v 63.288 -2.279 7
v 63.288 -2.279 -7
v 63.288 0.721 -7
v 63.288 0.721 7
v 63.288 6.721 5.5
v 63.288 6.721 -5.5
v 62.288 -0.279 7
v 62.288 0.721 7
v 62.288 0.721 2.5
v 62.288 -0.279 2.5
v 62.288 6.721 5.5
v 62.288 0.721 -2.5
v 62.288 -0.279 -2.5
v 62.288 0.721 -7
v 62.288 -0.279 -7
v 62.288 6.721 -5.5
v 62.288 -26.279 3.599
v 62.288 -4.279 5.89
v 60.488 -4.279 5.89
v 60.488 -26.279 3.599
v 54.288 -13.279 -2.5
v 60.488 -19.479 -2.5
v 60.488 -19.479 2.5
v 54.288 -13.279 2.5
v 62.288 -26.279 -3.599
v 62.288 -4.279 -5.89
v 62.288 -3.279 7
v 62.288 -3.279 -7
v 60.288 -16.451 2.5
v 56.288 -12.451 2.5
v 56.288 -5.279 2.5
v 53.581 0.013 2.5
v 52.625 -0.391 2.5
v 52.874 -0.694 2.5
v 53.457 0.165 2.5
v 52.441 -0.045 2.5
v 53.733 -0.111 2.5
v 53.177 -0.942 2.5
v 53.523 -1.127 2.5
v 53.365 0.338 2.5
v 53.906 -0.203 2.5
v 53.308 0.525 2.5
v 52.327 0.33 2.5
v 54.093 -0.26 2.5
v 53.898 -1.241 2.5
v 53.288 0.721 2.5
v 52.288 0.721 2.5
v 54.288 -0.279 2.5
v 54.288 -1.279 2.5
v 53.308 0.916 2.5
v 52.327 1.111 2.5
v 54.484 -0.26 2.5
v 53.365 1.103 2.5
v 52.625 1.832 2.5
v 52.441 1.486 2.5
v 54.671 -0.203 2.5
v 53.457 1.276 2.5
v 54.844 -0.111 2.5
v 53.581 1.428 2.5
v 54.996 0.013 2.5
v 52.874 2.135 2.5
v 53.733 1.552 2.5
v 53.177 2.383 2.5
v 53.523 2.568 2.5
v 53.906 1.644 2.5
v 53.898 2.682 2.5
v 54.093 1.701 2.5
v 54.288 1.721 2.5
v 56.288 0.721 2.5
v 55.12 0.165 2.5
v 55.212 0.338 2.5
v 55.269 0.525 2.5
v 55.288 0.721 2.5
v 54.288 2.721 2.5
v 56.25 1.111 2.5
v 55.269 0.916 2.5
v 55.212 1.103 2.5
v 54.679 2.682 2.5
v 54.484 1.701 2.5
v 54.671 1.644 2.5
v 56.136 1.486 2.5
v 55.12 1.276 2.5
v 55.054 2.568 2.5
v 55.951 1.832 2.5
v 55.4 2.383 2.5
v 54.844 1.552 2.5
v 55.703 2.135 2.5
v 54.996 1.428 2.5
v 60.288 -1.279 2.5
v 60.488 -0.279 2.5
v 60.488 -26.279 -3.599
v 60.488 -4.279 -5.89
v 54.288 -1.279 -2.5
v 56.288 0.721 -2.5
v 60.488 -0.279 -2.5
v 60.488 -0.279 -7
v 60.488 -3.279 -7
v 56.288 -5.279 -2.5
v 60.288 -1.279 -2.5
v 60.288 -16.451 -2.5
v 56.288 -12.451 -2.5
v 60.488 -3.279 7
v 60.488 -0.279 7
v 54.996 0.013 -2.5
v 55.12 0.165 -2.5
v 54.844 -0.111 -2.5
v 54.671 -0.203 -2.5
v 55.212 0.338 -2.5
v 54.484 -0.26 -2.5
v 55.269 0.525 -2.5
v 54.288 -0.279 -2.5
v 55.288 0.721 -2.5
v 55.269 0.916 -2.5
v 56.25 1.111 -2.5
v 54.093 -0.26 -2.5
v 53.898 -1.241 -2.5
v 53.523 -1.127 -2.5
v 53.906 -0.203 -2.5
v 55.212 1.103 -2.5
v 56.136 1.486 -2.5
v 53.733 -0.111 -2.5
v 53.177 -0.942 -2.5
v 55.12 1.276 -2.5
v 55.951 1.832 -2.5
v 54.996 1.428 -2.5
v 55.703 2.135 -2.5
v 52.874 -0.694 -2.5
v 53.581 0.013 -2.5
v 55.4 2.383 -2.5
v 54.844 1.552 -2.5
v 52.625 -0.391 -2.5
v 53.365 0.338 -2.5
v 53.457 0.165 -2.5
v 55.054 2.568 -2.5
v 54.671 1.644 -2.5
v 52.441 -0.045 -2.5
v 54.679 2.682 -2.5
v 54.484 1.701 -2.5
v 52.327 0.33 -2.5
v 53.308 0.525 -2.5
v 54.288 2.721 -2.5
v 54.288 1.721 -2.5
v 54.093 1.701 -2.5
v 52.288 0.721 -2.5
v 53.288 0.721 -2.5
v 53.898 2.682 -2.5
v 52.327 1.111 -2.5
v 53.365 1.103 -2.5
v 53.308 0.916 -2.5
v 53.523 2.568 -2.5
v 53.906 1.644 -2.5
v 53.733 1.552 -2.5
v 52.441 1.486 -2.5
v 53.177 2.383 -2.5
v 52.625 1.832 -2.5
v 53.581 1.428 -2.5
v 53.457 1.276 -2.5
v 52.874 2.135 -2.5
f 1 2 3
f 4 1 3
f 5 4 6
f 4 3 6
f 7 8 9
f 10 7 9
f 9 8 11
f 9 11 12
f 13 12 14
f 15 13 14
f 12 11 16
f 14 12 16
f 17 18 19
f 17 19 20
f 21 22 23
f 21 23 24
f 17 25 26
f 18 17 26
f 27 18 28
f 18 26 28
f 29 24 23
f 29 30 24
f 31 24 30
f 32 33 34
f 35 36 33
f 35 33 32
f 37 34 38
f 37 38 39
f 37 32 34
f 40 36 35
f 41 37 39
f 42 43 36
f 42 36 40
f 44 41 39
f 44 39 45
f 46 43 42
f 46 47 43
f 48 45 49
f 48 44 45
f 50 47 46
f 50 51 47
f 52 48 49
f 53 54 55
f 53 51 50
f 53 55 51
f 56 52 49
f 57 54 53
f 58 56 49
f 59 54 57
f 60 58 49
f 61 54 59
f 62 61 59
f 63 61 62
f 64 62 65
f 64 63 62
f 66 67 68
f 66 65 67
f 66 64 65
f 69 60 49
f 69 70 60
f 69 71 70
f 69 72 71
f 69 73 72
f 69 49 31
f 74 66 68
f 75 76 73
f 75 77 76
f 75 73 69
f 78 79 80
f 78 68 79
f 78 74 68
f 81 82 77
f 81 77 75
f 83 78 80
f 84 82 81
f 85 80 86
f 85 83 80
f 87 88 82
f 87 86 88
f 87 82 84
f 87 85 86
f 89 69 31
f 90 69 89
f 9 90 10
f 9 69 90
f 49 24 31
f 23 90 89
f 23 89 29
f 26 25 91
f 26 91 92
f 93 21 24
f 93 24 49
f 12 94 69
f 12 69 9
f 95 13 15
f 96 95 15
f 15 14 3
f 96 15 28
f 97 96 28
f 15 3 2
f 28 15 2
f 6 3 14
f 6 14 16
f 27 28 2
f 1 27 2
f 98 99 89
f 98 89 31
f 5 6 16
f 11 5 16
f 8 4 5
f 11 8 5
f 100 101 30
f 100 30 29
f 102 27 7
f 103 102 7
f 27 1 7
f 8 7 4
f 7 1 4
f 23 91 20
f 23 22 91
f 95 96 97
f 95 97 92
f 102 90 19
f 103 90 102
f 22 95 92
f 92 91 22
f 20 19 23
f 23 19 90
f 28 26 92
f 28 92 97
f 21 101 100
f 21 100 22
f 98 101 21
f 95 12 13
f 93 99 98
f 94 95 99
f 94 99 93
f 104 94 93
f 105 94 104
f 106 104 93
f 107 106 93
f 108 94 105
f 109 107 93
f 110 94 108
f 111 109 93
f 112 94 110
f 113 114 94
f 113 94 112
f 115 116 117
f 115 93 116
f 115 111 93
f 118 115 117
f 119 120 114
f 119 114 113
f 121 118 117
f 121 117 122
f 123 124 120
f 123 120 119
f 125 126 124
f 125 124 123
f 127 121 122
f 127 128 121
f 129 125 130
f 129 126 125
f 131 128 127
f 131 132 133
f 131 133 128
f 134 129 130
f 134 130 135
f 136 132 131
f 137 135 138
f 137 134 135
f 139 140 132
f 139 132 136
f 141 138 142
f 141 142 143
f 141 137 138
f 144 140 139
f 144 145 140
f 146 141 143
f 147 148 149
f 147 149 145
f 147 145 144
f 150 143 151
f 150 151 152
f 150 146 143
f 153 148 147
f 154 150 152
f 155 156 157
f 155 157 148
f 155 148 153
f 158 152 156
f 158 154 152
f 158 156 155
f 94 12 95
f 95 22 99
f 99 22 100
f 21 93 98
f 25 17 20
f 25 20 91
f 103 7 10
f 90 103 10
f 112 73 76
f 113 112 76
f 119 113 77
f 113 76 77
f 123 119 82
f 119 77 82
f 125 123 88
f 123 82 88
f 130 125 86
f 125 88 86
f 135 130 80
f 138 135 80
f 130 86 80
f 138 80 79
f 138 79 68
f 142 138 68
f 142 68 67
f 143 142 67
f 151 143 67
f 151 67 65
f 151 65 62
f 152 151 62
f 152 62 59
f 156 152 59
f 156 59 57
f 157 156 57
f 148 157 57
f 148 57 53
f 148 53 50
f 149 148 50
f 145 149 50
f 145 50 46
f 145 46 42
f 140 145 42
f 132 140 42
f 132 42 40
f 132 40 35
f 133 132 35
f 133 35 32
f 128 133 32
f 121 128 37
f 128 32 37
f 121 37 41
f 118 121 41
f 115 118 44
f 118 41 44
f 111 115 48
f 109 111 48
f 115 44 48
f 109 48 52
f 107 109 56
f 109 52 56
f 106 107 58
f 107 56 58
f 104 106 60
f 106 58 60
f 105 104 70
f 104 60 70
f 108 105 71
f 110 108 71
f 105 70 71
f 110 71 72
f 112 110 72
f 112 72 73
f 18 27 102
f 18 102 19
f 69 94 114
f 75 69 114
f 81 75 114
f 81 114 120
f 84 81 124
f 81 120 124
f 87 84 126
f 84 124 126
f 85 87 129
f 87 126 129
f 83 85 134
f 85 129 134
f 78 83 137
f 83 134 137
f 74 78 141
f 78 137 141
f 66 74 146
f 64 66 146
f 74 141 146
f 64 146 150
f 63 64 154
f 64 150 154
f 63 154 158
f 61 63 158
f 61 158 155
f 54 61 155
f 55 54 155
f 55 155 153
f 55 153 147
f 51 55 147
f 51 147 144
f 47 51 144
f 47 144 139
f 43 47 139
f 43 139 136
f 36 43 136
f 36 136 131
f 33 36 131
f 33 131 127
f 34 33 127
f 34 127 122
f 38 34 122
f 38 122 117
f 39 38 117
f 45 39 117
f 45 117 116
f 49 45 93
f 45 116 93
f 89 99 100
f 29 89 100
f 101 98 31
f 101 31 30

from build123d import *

# Parameters (mm, degrees)
EXTRUDE_1_DEPTH          = 2.5
EXTRUDE_1_DEPTH_BACK     = 2.5
EXTRUDE_2_DEPTH          = 3
EXTRUDE_3_DEPTH          = 1.8
CUT_EXTRUDE_1_DEPTH      = 72.103790411
CUT_EXTRUDE_1_DEPTH_BACK = 72.103790411
CUT_EXTRUDE_2_DEPTH      = 30.885943266
CUT_EXTRUDE_3_DEPTH      = 10
SKETCH_8_R               = 1
CUT_EXTRUDE_4_DEPTH      = 70.182991672


with BuildPart() as part:
    # 草图1 → 凸台-拉伸1 (new, two sides: drawn at the far end of the back side and taken through both)
    with BuildSketch(Plane.XY.offset(-EXTRUDE_1_DEPTH_BACK)):
        with BuildLine():
            ThreePointArc((56.288432405, 0.720527774), (52.874218842, 2.134741337), (54.288432405, -1.279472226))
            Line((54.288432405, -1.279472226), (54.288432405, -13.279472226))
            Line((54.288432405, -13.279472226), (62.288432405, -21.279472226))
            Line((62.288432405, -21.279472226), (62.288432405, 0.720527774))
            Line((62.288432405, 0.720527774), (56.288432405, 0.720527774))
        make_face()
        Polygon((56.288432405, -12.451045101), (56.288432405, -5.279472226), (60.288432405, -1.279472226), (60.288432405, -16.451045101), align=None, mode=Mode.SUBTRACT)
    extrude(amount=EXTRUDE_1_DEPTH + EXTRUDE_1_DEPTH_BACK)

    # 草图2 → 凸台-拉伸2 (add)
    with BuildSketch(Plane(origin=(62.288432405, 0, 0), x_dir=(0, 0, -1), z_dir=(1, 0, 0))):
        Polygon((-7, -3.279472226), (-4.5, -27.279472226), (4.5, -27.279472226), (7, -3.279472226), (7, 8.720527774), (-7, 8.720527774), align=None)
    extrude(amount=EXTRUDE_2_DEPTH)

    # 草图4 → 凸台-拉伸3 (add)
    with BuildSketch(Plane.ZY.offset(-62.288432405)):
        Polygon((-7, -0.279472226), (-7, -3.279472226), (-4.5, -27.279472226), (4.5, -27.279472226), (7, -3.279472226), (7, -0.279472226), align=None)
    extrude(amount=EXTRUDE_3_DEPTH)

    # 草图5 → 切除-拉伸1 (cut, two sides: drawn at the far end of the back side and taken through both)
    with BuildSketch(Plane.XY.offset(-CUT_EXTRUDE_1_DEPTH_BACK)):
        Polygon((62.288432405, -27.279472226), (62.288432405, -3.279472226), (63.288432405, -2.279472226), (63.288432405, 6.720527774), (62.288432405, 6.720527774), (62.288432405, 8.720527774), (65.288432405, 8.720527774), (65.288432405, -27.279472226), align=None)
    extrude(amount=CUT_EXTRUDE_1_DEPTH + CUT_EXTRUDE_1_DEPTH_BACK, mode=Mode.SUBTRACT)

    # 草图6 → 切除-拉伸2 (cut, through all)
    with BuildSketch(Plane(origin=(62.288432405, 0, 0), x_dir=(0, 0, -1), z_dir=(1, 0, 0))):
        Polygon((-7, -3.279472226), (-4.5, -27.279472226), (4.5, -27.279472226), (7, -3.279472226), (5.890422624, -4.279472226), (3.598755957, -26.279472226), (-3.598755957, -26.279472226), (-5.890422624, -4.279472226), align=None)
    extrude(amount=-CUT_EXTRUDE_2_DEPTH, mode=Mode.SUBTRACT)

    # 草图7 → 切除-拉伸3 (cut)
    with BuildSketch(Plane(origin=(63.288432405, 0, 0), x_dir=(0, 0, -1), z_dir=(1, 0, 0))):
        Polygon((-7, 0.720527774), (-5.5, 6.720527774), (-7, 6.720527774), align=None)
        Polygon((5.5, 6.720527774), (7, 6.720527774), (7, 0.720527774), align=None)
    extrude(amount=-CUT_EXTRUDE_3_DEPTH, mode=Mode.SUBTRACT)

    # 草图8 → 切除-拉伸4 (cut, through all)
    with BuildSketch(Plane.XY.offset(2.5)):
        with Locations((54.288432405, 0.720527774)):
            Circle(SKETCH_8_R)
    extrude(amount=-CUT_EXTRUDE_4_DEPTH, mode=Mode.SUBTRACT)


solid = part.part
